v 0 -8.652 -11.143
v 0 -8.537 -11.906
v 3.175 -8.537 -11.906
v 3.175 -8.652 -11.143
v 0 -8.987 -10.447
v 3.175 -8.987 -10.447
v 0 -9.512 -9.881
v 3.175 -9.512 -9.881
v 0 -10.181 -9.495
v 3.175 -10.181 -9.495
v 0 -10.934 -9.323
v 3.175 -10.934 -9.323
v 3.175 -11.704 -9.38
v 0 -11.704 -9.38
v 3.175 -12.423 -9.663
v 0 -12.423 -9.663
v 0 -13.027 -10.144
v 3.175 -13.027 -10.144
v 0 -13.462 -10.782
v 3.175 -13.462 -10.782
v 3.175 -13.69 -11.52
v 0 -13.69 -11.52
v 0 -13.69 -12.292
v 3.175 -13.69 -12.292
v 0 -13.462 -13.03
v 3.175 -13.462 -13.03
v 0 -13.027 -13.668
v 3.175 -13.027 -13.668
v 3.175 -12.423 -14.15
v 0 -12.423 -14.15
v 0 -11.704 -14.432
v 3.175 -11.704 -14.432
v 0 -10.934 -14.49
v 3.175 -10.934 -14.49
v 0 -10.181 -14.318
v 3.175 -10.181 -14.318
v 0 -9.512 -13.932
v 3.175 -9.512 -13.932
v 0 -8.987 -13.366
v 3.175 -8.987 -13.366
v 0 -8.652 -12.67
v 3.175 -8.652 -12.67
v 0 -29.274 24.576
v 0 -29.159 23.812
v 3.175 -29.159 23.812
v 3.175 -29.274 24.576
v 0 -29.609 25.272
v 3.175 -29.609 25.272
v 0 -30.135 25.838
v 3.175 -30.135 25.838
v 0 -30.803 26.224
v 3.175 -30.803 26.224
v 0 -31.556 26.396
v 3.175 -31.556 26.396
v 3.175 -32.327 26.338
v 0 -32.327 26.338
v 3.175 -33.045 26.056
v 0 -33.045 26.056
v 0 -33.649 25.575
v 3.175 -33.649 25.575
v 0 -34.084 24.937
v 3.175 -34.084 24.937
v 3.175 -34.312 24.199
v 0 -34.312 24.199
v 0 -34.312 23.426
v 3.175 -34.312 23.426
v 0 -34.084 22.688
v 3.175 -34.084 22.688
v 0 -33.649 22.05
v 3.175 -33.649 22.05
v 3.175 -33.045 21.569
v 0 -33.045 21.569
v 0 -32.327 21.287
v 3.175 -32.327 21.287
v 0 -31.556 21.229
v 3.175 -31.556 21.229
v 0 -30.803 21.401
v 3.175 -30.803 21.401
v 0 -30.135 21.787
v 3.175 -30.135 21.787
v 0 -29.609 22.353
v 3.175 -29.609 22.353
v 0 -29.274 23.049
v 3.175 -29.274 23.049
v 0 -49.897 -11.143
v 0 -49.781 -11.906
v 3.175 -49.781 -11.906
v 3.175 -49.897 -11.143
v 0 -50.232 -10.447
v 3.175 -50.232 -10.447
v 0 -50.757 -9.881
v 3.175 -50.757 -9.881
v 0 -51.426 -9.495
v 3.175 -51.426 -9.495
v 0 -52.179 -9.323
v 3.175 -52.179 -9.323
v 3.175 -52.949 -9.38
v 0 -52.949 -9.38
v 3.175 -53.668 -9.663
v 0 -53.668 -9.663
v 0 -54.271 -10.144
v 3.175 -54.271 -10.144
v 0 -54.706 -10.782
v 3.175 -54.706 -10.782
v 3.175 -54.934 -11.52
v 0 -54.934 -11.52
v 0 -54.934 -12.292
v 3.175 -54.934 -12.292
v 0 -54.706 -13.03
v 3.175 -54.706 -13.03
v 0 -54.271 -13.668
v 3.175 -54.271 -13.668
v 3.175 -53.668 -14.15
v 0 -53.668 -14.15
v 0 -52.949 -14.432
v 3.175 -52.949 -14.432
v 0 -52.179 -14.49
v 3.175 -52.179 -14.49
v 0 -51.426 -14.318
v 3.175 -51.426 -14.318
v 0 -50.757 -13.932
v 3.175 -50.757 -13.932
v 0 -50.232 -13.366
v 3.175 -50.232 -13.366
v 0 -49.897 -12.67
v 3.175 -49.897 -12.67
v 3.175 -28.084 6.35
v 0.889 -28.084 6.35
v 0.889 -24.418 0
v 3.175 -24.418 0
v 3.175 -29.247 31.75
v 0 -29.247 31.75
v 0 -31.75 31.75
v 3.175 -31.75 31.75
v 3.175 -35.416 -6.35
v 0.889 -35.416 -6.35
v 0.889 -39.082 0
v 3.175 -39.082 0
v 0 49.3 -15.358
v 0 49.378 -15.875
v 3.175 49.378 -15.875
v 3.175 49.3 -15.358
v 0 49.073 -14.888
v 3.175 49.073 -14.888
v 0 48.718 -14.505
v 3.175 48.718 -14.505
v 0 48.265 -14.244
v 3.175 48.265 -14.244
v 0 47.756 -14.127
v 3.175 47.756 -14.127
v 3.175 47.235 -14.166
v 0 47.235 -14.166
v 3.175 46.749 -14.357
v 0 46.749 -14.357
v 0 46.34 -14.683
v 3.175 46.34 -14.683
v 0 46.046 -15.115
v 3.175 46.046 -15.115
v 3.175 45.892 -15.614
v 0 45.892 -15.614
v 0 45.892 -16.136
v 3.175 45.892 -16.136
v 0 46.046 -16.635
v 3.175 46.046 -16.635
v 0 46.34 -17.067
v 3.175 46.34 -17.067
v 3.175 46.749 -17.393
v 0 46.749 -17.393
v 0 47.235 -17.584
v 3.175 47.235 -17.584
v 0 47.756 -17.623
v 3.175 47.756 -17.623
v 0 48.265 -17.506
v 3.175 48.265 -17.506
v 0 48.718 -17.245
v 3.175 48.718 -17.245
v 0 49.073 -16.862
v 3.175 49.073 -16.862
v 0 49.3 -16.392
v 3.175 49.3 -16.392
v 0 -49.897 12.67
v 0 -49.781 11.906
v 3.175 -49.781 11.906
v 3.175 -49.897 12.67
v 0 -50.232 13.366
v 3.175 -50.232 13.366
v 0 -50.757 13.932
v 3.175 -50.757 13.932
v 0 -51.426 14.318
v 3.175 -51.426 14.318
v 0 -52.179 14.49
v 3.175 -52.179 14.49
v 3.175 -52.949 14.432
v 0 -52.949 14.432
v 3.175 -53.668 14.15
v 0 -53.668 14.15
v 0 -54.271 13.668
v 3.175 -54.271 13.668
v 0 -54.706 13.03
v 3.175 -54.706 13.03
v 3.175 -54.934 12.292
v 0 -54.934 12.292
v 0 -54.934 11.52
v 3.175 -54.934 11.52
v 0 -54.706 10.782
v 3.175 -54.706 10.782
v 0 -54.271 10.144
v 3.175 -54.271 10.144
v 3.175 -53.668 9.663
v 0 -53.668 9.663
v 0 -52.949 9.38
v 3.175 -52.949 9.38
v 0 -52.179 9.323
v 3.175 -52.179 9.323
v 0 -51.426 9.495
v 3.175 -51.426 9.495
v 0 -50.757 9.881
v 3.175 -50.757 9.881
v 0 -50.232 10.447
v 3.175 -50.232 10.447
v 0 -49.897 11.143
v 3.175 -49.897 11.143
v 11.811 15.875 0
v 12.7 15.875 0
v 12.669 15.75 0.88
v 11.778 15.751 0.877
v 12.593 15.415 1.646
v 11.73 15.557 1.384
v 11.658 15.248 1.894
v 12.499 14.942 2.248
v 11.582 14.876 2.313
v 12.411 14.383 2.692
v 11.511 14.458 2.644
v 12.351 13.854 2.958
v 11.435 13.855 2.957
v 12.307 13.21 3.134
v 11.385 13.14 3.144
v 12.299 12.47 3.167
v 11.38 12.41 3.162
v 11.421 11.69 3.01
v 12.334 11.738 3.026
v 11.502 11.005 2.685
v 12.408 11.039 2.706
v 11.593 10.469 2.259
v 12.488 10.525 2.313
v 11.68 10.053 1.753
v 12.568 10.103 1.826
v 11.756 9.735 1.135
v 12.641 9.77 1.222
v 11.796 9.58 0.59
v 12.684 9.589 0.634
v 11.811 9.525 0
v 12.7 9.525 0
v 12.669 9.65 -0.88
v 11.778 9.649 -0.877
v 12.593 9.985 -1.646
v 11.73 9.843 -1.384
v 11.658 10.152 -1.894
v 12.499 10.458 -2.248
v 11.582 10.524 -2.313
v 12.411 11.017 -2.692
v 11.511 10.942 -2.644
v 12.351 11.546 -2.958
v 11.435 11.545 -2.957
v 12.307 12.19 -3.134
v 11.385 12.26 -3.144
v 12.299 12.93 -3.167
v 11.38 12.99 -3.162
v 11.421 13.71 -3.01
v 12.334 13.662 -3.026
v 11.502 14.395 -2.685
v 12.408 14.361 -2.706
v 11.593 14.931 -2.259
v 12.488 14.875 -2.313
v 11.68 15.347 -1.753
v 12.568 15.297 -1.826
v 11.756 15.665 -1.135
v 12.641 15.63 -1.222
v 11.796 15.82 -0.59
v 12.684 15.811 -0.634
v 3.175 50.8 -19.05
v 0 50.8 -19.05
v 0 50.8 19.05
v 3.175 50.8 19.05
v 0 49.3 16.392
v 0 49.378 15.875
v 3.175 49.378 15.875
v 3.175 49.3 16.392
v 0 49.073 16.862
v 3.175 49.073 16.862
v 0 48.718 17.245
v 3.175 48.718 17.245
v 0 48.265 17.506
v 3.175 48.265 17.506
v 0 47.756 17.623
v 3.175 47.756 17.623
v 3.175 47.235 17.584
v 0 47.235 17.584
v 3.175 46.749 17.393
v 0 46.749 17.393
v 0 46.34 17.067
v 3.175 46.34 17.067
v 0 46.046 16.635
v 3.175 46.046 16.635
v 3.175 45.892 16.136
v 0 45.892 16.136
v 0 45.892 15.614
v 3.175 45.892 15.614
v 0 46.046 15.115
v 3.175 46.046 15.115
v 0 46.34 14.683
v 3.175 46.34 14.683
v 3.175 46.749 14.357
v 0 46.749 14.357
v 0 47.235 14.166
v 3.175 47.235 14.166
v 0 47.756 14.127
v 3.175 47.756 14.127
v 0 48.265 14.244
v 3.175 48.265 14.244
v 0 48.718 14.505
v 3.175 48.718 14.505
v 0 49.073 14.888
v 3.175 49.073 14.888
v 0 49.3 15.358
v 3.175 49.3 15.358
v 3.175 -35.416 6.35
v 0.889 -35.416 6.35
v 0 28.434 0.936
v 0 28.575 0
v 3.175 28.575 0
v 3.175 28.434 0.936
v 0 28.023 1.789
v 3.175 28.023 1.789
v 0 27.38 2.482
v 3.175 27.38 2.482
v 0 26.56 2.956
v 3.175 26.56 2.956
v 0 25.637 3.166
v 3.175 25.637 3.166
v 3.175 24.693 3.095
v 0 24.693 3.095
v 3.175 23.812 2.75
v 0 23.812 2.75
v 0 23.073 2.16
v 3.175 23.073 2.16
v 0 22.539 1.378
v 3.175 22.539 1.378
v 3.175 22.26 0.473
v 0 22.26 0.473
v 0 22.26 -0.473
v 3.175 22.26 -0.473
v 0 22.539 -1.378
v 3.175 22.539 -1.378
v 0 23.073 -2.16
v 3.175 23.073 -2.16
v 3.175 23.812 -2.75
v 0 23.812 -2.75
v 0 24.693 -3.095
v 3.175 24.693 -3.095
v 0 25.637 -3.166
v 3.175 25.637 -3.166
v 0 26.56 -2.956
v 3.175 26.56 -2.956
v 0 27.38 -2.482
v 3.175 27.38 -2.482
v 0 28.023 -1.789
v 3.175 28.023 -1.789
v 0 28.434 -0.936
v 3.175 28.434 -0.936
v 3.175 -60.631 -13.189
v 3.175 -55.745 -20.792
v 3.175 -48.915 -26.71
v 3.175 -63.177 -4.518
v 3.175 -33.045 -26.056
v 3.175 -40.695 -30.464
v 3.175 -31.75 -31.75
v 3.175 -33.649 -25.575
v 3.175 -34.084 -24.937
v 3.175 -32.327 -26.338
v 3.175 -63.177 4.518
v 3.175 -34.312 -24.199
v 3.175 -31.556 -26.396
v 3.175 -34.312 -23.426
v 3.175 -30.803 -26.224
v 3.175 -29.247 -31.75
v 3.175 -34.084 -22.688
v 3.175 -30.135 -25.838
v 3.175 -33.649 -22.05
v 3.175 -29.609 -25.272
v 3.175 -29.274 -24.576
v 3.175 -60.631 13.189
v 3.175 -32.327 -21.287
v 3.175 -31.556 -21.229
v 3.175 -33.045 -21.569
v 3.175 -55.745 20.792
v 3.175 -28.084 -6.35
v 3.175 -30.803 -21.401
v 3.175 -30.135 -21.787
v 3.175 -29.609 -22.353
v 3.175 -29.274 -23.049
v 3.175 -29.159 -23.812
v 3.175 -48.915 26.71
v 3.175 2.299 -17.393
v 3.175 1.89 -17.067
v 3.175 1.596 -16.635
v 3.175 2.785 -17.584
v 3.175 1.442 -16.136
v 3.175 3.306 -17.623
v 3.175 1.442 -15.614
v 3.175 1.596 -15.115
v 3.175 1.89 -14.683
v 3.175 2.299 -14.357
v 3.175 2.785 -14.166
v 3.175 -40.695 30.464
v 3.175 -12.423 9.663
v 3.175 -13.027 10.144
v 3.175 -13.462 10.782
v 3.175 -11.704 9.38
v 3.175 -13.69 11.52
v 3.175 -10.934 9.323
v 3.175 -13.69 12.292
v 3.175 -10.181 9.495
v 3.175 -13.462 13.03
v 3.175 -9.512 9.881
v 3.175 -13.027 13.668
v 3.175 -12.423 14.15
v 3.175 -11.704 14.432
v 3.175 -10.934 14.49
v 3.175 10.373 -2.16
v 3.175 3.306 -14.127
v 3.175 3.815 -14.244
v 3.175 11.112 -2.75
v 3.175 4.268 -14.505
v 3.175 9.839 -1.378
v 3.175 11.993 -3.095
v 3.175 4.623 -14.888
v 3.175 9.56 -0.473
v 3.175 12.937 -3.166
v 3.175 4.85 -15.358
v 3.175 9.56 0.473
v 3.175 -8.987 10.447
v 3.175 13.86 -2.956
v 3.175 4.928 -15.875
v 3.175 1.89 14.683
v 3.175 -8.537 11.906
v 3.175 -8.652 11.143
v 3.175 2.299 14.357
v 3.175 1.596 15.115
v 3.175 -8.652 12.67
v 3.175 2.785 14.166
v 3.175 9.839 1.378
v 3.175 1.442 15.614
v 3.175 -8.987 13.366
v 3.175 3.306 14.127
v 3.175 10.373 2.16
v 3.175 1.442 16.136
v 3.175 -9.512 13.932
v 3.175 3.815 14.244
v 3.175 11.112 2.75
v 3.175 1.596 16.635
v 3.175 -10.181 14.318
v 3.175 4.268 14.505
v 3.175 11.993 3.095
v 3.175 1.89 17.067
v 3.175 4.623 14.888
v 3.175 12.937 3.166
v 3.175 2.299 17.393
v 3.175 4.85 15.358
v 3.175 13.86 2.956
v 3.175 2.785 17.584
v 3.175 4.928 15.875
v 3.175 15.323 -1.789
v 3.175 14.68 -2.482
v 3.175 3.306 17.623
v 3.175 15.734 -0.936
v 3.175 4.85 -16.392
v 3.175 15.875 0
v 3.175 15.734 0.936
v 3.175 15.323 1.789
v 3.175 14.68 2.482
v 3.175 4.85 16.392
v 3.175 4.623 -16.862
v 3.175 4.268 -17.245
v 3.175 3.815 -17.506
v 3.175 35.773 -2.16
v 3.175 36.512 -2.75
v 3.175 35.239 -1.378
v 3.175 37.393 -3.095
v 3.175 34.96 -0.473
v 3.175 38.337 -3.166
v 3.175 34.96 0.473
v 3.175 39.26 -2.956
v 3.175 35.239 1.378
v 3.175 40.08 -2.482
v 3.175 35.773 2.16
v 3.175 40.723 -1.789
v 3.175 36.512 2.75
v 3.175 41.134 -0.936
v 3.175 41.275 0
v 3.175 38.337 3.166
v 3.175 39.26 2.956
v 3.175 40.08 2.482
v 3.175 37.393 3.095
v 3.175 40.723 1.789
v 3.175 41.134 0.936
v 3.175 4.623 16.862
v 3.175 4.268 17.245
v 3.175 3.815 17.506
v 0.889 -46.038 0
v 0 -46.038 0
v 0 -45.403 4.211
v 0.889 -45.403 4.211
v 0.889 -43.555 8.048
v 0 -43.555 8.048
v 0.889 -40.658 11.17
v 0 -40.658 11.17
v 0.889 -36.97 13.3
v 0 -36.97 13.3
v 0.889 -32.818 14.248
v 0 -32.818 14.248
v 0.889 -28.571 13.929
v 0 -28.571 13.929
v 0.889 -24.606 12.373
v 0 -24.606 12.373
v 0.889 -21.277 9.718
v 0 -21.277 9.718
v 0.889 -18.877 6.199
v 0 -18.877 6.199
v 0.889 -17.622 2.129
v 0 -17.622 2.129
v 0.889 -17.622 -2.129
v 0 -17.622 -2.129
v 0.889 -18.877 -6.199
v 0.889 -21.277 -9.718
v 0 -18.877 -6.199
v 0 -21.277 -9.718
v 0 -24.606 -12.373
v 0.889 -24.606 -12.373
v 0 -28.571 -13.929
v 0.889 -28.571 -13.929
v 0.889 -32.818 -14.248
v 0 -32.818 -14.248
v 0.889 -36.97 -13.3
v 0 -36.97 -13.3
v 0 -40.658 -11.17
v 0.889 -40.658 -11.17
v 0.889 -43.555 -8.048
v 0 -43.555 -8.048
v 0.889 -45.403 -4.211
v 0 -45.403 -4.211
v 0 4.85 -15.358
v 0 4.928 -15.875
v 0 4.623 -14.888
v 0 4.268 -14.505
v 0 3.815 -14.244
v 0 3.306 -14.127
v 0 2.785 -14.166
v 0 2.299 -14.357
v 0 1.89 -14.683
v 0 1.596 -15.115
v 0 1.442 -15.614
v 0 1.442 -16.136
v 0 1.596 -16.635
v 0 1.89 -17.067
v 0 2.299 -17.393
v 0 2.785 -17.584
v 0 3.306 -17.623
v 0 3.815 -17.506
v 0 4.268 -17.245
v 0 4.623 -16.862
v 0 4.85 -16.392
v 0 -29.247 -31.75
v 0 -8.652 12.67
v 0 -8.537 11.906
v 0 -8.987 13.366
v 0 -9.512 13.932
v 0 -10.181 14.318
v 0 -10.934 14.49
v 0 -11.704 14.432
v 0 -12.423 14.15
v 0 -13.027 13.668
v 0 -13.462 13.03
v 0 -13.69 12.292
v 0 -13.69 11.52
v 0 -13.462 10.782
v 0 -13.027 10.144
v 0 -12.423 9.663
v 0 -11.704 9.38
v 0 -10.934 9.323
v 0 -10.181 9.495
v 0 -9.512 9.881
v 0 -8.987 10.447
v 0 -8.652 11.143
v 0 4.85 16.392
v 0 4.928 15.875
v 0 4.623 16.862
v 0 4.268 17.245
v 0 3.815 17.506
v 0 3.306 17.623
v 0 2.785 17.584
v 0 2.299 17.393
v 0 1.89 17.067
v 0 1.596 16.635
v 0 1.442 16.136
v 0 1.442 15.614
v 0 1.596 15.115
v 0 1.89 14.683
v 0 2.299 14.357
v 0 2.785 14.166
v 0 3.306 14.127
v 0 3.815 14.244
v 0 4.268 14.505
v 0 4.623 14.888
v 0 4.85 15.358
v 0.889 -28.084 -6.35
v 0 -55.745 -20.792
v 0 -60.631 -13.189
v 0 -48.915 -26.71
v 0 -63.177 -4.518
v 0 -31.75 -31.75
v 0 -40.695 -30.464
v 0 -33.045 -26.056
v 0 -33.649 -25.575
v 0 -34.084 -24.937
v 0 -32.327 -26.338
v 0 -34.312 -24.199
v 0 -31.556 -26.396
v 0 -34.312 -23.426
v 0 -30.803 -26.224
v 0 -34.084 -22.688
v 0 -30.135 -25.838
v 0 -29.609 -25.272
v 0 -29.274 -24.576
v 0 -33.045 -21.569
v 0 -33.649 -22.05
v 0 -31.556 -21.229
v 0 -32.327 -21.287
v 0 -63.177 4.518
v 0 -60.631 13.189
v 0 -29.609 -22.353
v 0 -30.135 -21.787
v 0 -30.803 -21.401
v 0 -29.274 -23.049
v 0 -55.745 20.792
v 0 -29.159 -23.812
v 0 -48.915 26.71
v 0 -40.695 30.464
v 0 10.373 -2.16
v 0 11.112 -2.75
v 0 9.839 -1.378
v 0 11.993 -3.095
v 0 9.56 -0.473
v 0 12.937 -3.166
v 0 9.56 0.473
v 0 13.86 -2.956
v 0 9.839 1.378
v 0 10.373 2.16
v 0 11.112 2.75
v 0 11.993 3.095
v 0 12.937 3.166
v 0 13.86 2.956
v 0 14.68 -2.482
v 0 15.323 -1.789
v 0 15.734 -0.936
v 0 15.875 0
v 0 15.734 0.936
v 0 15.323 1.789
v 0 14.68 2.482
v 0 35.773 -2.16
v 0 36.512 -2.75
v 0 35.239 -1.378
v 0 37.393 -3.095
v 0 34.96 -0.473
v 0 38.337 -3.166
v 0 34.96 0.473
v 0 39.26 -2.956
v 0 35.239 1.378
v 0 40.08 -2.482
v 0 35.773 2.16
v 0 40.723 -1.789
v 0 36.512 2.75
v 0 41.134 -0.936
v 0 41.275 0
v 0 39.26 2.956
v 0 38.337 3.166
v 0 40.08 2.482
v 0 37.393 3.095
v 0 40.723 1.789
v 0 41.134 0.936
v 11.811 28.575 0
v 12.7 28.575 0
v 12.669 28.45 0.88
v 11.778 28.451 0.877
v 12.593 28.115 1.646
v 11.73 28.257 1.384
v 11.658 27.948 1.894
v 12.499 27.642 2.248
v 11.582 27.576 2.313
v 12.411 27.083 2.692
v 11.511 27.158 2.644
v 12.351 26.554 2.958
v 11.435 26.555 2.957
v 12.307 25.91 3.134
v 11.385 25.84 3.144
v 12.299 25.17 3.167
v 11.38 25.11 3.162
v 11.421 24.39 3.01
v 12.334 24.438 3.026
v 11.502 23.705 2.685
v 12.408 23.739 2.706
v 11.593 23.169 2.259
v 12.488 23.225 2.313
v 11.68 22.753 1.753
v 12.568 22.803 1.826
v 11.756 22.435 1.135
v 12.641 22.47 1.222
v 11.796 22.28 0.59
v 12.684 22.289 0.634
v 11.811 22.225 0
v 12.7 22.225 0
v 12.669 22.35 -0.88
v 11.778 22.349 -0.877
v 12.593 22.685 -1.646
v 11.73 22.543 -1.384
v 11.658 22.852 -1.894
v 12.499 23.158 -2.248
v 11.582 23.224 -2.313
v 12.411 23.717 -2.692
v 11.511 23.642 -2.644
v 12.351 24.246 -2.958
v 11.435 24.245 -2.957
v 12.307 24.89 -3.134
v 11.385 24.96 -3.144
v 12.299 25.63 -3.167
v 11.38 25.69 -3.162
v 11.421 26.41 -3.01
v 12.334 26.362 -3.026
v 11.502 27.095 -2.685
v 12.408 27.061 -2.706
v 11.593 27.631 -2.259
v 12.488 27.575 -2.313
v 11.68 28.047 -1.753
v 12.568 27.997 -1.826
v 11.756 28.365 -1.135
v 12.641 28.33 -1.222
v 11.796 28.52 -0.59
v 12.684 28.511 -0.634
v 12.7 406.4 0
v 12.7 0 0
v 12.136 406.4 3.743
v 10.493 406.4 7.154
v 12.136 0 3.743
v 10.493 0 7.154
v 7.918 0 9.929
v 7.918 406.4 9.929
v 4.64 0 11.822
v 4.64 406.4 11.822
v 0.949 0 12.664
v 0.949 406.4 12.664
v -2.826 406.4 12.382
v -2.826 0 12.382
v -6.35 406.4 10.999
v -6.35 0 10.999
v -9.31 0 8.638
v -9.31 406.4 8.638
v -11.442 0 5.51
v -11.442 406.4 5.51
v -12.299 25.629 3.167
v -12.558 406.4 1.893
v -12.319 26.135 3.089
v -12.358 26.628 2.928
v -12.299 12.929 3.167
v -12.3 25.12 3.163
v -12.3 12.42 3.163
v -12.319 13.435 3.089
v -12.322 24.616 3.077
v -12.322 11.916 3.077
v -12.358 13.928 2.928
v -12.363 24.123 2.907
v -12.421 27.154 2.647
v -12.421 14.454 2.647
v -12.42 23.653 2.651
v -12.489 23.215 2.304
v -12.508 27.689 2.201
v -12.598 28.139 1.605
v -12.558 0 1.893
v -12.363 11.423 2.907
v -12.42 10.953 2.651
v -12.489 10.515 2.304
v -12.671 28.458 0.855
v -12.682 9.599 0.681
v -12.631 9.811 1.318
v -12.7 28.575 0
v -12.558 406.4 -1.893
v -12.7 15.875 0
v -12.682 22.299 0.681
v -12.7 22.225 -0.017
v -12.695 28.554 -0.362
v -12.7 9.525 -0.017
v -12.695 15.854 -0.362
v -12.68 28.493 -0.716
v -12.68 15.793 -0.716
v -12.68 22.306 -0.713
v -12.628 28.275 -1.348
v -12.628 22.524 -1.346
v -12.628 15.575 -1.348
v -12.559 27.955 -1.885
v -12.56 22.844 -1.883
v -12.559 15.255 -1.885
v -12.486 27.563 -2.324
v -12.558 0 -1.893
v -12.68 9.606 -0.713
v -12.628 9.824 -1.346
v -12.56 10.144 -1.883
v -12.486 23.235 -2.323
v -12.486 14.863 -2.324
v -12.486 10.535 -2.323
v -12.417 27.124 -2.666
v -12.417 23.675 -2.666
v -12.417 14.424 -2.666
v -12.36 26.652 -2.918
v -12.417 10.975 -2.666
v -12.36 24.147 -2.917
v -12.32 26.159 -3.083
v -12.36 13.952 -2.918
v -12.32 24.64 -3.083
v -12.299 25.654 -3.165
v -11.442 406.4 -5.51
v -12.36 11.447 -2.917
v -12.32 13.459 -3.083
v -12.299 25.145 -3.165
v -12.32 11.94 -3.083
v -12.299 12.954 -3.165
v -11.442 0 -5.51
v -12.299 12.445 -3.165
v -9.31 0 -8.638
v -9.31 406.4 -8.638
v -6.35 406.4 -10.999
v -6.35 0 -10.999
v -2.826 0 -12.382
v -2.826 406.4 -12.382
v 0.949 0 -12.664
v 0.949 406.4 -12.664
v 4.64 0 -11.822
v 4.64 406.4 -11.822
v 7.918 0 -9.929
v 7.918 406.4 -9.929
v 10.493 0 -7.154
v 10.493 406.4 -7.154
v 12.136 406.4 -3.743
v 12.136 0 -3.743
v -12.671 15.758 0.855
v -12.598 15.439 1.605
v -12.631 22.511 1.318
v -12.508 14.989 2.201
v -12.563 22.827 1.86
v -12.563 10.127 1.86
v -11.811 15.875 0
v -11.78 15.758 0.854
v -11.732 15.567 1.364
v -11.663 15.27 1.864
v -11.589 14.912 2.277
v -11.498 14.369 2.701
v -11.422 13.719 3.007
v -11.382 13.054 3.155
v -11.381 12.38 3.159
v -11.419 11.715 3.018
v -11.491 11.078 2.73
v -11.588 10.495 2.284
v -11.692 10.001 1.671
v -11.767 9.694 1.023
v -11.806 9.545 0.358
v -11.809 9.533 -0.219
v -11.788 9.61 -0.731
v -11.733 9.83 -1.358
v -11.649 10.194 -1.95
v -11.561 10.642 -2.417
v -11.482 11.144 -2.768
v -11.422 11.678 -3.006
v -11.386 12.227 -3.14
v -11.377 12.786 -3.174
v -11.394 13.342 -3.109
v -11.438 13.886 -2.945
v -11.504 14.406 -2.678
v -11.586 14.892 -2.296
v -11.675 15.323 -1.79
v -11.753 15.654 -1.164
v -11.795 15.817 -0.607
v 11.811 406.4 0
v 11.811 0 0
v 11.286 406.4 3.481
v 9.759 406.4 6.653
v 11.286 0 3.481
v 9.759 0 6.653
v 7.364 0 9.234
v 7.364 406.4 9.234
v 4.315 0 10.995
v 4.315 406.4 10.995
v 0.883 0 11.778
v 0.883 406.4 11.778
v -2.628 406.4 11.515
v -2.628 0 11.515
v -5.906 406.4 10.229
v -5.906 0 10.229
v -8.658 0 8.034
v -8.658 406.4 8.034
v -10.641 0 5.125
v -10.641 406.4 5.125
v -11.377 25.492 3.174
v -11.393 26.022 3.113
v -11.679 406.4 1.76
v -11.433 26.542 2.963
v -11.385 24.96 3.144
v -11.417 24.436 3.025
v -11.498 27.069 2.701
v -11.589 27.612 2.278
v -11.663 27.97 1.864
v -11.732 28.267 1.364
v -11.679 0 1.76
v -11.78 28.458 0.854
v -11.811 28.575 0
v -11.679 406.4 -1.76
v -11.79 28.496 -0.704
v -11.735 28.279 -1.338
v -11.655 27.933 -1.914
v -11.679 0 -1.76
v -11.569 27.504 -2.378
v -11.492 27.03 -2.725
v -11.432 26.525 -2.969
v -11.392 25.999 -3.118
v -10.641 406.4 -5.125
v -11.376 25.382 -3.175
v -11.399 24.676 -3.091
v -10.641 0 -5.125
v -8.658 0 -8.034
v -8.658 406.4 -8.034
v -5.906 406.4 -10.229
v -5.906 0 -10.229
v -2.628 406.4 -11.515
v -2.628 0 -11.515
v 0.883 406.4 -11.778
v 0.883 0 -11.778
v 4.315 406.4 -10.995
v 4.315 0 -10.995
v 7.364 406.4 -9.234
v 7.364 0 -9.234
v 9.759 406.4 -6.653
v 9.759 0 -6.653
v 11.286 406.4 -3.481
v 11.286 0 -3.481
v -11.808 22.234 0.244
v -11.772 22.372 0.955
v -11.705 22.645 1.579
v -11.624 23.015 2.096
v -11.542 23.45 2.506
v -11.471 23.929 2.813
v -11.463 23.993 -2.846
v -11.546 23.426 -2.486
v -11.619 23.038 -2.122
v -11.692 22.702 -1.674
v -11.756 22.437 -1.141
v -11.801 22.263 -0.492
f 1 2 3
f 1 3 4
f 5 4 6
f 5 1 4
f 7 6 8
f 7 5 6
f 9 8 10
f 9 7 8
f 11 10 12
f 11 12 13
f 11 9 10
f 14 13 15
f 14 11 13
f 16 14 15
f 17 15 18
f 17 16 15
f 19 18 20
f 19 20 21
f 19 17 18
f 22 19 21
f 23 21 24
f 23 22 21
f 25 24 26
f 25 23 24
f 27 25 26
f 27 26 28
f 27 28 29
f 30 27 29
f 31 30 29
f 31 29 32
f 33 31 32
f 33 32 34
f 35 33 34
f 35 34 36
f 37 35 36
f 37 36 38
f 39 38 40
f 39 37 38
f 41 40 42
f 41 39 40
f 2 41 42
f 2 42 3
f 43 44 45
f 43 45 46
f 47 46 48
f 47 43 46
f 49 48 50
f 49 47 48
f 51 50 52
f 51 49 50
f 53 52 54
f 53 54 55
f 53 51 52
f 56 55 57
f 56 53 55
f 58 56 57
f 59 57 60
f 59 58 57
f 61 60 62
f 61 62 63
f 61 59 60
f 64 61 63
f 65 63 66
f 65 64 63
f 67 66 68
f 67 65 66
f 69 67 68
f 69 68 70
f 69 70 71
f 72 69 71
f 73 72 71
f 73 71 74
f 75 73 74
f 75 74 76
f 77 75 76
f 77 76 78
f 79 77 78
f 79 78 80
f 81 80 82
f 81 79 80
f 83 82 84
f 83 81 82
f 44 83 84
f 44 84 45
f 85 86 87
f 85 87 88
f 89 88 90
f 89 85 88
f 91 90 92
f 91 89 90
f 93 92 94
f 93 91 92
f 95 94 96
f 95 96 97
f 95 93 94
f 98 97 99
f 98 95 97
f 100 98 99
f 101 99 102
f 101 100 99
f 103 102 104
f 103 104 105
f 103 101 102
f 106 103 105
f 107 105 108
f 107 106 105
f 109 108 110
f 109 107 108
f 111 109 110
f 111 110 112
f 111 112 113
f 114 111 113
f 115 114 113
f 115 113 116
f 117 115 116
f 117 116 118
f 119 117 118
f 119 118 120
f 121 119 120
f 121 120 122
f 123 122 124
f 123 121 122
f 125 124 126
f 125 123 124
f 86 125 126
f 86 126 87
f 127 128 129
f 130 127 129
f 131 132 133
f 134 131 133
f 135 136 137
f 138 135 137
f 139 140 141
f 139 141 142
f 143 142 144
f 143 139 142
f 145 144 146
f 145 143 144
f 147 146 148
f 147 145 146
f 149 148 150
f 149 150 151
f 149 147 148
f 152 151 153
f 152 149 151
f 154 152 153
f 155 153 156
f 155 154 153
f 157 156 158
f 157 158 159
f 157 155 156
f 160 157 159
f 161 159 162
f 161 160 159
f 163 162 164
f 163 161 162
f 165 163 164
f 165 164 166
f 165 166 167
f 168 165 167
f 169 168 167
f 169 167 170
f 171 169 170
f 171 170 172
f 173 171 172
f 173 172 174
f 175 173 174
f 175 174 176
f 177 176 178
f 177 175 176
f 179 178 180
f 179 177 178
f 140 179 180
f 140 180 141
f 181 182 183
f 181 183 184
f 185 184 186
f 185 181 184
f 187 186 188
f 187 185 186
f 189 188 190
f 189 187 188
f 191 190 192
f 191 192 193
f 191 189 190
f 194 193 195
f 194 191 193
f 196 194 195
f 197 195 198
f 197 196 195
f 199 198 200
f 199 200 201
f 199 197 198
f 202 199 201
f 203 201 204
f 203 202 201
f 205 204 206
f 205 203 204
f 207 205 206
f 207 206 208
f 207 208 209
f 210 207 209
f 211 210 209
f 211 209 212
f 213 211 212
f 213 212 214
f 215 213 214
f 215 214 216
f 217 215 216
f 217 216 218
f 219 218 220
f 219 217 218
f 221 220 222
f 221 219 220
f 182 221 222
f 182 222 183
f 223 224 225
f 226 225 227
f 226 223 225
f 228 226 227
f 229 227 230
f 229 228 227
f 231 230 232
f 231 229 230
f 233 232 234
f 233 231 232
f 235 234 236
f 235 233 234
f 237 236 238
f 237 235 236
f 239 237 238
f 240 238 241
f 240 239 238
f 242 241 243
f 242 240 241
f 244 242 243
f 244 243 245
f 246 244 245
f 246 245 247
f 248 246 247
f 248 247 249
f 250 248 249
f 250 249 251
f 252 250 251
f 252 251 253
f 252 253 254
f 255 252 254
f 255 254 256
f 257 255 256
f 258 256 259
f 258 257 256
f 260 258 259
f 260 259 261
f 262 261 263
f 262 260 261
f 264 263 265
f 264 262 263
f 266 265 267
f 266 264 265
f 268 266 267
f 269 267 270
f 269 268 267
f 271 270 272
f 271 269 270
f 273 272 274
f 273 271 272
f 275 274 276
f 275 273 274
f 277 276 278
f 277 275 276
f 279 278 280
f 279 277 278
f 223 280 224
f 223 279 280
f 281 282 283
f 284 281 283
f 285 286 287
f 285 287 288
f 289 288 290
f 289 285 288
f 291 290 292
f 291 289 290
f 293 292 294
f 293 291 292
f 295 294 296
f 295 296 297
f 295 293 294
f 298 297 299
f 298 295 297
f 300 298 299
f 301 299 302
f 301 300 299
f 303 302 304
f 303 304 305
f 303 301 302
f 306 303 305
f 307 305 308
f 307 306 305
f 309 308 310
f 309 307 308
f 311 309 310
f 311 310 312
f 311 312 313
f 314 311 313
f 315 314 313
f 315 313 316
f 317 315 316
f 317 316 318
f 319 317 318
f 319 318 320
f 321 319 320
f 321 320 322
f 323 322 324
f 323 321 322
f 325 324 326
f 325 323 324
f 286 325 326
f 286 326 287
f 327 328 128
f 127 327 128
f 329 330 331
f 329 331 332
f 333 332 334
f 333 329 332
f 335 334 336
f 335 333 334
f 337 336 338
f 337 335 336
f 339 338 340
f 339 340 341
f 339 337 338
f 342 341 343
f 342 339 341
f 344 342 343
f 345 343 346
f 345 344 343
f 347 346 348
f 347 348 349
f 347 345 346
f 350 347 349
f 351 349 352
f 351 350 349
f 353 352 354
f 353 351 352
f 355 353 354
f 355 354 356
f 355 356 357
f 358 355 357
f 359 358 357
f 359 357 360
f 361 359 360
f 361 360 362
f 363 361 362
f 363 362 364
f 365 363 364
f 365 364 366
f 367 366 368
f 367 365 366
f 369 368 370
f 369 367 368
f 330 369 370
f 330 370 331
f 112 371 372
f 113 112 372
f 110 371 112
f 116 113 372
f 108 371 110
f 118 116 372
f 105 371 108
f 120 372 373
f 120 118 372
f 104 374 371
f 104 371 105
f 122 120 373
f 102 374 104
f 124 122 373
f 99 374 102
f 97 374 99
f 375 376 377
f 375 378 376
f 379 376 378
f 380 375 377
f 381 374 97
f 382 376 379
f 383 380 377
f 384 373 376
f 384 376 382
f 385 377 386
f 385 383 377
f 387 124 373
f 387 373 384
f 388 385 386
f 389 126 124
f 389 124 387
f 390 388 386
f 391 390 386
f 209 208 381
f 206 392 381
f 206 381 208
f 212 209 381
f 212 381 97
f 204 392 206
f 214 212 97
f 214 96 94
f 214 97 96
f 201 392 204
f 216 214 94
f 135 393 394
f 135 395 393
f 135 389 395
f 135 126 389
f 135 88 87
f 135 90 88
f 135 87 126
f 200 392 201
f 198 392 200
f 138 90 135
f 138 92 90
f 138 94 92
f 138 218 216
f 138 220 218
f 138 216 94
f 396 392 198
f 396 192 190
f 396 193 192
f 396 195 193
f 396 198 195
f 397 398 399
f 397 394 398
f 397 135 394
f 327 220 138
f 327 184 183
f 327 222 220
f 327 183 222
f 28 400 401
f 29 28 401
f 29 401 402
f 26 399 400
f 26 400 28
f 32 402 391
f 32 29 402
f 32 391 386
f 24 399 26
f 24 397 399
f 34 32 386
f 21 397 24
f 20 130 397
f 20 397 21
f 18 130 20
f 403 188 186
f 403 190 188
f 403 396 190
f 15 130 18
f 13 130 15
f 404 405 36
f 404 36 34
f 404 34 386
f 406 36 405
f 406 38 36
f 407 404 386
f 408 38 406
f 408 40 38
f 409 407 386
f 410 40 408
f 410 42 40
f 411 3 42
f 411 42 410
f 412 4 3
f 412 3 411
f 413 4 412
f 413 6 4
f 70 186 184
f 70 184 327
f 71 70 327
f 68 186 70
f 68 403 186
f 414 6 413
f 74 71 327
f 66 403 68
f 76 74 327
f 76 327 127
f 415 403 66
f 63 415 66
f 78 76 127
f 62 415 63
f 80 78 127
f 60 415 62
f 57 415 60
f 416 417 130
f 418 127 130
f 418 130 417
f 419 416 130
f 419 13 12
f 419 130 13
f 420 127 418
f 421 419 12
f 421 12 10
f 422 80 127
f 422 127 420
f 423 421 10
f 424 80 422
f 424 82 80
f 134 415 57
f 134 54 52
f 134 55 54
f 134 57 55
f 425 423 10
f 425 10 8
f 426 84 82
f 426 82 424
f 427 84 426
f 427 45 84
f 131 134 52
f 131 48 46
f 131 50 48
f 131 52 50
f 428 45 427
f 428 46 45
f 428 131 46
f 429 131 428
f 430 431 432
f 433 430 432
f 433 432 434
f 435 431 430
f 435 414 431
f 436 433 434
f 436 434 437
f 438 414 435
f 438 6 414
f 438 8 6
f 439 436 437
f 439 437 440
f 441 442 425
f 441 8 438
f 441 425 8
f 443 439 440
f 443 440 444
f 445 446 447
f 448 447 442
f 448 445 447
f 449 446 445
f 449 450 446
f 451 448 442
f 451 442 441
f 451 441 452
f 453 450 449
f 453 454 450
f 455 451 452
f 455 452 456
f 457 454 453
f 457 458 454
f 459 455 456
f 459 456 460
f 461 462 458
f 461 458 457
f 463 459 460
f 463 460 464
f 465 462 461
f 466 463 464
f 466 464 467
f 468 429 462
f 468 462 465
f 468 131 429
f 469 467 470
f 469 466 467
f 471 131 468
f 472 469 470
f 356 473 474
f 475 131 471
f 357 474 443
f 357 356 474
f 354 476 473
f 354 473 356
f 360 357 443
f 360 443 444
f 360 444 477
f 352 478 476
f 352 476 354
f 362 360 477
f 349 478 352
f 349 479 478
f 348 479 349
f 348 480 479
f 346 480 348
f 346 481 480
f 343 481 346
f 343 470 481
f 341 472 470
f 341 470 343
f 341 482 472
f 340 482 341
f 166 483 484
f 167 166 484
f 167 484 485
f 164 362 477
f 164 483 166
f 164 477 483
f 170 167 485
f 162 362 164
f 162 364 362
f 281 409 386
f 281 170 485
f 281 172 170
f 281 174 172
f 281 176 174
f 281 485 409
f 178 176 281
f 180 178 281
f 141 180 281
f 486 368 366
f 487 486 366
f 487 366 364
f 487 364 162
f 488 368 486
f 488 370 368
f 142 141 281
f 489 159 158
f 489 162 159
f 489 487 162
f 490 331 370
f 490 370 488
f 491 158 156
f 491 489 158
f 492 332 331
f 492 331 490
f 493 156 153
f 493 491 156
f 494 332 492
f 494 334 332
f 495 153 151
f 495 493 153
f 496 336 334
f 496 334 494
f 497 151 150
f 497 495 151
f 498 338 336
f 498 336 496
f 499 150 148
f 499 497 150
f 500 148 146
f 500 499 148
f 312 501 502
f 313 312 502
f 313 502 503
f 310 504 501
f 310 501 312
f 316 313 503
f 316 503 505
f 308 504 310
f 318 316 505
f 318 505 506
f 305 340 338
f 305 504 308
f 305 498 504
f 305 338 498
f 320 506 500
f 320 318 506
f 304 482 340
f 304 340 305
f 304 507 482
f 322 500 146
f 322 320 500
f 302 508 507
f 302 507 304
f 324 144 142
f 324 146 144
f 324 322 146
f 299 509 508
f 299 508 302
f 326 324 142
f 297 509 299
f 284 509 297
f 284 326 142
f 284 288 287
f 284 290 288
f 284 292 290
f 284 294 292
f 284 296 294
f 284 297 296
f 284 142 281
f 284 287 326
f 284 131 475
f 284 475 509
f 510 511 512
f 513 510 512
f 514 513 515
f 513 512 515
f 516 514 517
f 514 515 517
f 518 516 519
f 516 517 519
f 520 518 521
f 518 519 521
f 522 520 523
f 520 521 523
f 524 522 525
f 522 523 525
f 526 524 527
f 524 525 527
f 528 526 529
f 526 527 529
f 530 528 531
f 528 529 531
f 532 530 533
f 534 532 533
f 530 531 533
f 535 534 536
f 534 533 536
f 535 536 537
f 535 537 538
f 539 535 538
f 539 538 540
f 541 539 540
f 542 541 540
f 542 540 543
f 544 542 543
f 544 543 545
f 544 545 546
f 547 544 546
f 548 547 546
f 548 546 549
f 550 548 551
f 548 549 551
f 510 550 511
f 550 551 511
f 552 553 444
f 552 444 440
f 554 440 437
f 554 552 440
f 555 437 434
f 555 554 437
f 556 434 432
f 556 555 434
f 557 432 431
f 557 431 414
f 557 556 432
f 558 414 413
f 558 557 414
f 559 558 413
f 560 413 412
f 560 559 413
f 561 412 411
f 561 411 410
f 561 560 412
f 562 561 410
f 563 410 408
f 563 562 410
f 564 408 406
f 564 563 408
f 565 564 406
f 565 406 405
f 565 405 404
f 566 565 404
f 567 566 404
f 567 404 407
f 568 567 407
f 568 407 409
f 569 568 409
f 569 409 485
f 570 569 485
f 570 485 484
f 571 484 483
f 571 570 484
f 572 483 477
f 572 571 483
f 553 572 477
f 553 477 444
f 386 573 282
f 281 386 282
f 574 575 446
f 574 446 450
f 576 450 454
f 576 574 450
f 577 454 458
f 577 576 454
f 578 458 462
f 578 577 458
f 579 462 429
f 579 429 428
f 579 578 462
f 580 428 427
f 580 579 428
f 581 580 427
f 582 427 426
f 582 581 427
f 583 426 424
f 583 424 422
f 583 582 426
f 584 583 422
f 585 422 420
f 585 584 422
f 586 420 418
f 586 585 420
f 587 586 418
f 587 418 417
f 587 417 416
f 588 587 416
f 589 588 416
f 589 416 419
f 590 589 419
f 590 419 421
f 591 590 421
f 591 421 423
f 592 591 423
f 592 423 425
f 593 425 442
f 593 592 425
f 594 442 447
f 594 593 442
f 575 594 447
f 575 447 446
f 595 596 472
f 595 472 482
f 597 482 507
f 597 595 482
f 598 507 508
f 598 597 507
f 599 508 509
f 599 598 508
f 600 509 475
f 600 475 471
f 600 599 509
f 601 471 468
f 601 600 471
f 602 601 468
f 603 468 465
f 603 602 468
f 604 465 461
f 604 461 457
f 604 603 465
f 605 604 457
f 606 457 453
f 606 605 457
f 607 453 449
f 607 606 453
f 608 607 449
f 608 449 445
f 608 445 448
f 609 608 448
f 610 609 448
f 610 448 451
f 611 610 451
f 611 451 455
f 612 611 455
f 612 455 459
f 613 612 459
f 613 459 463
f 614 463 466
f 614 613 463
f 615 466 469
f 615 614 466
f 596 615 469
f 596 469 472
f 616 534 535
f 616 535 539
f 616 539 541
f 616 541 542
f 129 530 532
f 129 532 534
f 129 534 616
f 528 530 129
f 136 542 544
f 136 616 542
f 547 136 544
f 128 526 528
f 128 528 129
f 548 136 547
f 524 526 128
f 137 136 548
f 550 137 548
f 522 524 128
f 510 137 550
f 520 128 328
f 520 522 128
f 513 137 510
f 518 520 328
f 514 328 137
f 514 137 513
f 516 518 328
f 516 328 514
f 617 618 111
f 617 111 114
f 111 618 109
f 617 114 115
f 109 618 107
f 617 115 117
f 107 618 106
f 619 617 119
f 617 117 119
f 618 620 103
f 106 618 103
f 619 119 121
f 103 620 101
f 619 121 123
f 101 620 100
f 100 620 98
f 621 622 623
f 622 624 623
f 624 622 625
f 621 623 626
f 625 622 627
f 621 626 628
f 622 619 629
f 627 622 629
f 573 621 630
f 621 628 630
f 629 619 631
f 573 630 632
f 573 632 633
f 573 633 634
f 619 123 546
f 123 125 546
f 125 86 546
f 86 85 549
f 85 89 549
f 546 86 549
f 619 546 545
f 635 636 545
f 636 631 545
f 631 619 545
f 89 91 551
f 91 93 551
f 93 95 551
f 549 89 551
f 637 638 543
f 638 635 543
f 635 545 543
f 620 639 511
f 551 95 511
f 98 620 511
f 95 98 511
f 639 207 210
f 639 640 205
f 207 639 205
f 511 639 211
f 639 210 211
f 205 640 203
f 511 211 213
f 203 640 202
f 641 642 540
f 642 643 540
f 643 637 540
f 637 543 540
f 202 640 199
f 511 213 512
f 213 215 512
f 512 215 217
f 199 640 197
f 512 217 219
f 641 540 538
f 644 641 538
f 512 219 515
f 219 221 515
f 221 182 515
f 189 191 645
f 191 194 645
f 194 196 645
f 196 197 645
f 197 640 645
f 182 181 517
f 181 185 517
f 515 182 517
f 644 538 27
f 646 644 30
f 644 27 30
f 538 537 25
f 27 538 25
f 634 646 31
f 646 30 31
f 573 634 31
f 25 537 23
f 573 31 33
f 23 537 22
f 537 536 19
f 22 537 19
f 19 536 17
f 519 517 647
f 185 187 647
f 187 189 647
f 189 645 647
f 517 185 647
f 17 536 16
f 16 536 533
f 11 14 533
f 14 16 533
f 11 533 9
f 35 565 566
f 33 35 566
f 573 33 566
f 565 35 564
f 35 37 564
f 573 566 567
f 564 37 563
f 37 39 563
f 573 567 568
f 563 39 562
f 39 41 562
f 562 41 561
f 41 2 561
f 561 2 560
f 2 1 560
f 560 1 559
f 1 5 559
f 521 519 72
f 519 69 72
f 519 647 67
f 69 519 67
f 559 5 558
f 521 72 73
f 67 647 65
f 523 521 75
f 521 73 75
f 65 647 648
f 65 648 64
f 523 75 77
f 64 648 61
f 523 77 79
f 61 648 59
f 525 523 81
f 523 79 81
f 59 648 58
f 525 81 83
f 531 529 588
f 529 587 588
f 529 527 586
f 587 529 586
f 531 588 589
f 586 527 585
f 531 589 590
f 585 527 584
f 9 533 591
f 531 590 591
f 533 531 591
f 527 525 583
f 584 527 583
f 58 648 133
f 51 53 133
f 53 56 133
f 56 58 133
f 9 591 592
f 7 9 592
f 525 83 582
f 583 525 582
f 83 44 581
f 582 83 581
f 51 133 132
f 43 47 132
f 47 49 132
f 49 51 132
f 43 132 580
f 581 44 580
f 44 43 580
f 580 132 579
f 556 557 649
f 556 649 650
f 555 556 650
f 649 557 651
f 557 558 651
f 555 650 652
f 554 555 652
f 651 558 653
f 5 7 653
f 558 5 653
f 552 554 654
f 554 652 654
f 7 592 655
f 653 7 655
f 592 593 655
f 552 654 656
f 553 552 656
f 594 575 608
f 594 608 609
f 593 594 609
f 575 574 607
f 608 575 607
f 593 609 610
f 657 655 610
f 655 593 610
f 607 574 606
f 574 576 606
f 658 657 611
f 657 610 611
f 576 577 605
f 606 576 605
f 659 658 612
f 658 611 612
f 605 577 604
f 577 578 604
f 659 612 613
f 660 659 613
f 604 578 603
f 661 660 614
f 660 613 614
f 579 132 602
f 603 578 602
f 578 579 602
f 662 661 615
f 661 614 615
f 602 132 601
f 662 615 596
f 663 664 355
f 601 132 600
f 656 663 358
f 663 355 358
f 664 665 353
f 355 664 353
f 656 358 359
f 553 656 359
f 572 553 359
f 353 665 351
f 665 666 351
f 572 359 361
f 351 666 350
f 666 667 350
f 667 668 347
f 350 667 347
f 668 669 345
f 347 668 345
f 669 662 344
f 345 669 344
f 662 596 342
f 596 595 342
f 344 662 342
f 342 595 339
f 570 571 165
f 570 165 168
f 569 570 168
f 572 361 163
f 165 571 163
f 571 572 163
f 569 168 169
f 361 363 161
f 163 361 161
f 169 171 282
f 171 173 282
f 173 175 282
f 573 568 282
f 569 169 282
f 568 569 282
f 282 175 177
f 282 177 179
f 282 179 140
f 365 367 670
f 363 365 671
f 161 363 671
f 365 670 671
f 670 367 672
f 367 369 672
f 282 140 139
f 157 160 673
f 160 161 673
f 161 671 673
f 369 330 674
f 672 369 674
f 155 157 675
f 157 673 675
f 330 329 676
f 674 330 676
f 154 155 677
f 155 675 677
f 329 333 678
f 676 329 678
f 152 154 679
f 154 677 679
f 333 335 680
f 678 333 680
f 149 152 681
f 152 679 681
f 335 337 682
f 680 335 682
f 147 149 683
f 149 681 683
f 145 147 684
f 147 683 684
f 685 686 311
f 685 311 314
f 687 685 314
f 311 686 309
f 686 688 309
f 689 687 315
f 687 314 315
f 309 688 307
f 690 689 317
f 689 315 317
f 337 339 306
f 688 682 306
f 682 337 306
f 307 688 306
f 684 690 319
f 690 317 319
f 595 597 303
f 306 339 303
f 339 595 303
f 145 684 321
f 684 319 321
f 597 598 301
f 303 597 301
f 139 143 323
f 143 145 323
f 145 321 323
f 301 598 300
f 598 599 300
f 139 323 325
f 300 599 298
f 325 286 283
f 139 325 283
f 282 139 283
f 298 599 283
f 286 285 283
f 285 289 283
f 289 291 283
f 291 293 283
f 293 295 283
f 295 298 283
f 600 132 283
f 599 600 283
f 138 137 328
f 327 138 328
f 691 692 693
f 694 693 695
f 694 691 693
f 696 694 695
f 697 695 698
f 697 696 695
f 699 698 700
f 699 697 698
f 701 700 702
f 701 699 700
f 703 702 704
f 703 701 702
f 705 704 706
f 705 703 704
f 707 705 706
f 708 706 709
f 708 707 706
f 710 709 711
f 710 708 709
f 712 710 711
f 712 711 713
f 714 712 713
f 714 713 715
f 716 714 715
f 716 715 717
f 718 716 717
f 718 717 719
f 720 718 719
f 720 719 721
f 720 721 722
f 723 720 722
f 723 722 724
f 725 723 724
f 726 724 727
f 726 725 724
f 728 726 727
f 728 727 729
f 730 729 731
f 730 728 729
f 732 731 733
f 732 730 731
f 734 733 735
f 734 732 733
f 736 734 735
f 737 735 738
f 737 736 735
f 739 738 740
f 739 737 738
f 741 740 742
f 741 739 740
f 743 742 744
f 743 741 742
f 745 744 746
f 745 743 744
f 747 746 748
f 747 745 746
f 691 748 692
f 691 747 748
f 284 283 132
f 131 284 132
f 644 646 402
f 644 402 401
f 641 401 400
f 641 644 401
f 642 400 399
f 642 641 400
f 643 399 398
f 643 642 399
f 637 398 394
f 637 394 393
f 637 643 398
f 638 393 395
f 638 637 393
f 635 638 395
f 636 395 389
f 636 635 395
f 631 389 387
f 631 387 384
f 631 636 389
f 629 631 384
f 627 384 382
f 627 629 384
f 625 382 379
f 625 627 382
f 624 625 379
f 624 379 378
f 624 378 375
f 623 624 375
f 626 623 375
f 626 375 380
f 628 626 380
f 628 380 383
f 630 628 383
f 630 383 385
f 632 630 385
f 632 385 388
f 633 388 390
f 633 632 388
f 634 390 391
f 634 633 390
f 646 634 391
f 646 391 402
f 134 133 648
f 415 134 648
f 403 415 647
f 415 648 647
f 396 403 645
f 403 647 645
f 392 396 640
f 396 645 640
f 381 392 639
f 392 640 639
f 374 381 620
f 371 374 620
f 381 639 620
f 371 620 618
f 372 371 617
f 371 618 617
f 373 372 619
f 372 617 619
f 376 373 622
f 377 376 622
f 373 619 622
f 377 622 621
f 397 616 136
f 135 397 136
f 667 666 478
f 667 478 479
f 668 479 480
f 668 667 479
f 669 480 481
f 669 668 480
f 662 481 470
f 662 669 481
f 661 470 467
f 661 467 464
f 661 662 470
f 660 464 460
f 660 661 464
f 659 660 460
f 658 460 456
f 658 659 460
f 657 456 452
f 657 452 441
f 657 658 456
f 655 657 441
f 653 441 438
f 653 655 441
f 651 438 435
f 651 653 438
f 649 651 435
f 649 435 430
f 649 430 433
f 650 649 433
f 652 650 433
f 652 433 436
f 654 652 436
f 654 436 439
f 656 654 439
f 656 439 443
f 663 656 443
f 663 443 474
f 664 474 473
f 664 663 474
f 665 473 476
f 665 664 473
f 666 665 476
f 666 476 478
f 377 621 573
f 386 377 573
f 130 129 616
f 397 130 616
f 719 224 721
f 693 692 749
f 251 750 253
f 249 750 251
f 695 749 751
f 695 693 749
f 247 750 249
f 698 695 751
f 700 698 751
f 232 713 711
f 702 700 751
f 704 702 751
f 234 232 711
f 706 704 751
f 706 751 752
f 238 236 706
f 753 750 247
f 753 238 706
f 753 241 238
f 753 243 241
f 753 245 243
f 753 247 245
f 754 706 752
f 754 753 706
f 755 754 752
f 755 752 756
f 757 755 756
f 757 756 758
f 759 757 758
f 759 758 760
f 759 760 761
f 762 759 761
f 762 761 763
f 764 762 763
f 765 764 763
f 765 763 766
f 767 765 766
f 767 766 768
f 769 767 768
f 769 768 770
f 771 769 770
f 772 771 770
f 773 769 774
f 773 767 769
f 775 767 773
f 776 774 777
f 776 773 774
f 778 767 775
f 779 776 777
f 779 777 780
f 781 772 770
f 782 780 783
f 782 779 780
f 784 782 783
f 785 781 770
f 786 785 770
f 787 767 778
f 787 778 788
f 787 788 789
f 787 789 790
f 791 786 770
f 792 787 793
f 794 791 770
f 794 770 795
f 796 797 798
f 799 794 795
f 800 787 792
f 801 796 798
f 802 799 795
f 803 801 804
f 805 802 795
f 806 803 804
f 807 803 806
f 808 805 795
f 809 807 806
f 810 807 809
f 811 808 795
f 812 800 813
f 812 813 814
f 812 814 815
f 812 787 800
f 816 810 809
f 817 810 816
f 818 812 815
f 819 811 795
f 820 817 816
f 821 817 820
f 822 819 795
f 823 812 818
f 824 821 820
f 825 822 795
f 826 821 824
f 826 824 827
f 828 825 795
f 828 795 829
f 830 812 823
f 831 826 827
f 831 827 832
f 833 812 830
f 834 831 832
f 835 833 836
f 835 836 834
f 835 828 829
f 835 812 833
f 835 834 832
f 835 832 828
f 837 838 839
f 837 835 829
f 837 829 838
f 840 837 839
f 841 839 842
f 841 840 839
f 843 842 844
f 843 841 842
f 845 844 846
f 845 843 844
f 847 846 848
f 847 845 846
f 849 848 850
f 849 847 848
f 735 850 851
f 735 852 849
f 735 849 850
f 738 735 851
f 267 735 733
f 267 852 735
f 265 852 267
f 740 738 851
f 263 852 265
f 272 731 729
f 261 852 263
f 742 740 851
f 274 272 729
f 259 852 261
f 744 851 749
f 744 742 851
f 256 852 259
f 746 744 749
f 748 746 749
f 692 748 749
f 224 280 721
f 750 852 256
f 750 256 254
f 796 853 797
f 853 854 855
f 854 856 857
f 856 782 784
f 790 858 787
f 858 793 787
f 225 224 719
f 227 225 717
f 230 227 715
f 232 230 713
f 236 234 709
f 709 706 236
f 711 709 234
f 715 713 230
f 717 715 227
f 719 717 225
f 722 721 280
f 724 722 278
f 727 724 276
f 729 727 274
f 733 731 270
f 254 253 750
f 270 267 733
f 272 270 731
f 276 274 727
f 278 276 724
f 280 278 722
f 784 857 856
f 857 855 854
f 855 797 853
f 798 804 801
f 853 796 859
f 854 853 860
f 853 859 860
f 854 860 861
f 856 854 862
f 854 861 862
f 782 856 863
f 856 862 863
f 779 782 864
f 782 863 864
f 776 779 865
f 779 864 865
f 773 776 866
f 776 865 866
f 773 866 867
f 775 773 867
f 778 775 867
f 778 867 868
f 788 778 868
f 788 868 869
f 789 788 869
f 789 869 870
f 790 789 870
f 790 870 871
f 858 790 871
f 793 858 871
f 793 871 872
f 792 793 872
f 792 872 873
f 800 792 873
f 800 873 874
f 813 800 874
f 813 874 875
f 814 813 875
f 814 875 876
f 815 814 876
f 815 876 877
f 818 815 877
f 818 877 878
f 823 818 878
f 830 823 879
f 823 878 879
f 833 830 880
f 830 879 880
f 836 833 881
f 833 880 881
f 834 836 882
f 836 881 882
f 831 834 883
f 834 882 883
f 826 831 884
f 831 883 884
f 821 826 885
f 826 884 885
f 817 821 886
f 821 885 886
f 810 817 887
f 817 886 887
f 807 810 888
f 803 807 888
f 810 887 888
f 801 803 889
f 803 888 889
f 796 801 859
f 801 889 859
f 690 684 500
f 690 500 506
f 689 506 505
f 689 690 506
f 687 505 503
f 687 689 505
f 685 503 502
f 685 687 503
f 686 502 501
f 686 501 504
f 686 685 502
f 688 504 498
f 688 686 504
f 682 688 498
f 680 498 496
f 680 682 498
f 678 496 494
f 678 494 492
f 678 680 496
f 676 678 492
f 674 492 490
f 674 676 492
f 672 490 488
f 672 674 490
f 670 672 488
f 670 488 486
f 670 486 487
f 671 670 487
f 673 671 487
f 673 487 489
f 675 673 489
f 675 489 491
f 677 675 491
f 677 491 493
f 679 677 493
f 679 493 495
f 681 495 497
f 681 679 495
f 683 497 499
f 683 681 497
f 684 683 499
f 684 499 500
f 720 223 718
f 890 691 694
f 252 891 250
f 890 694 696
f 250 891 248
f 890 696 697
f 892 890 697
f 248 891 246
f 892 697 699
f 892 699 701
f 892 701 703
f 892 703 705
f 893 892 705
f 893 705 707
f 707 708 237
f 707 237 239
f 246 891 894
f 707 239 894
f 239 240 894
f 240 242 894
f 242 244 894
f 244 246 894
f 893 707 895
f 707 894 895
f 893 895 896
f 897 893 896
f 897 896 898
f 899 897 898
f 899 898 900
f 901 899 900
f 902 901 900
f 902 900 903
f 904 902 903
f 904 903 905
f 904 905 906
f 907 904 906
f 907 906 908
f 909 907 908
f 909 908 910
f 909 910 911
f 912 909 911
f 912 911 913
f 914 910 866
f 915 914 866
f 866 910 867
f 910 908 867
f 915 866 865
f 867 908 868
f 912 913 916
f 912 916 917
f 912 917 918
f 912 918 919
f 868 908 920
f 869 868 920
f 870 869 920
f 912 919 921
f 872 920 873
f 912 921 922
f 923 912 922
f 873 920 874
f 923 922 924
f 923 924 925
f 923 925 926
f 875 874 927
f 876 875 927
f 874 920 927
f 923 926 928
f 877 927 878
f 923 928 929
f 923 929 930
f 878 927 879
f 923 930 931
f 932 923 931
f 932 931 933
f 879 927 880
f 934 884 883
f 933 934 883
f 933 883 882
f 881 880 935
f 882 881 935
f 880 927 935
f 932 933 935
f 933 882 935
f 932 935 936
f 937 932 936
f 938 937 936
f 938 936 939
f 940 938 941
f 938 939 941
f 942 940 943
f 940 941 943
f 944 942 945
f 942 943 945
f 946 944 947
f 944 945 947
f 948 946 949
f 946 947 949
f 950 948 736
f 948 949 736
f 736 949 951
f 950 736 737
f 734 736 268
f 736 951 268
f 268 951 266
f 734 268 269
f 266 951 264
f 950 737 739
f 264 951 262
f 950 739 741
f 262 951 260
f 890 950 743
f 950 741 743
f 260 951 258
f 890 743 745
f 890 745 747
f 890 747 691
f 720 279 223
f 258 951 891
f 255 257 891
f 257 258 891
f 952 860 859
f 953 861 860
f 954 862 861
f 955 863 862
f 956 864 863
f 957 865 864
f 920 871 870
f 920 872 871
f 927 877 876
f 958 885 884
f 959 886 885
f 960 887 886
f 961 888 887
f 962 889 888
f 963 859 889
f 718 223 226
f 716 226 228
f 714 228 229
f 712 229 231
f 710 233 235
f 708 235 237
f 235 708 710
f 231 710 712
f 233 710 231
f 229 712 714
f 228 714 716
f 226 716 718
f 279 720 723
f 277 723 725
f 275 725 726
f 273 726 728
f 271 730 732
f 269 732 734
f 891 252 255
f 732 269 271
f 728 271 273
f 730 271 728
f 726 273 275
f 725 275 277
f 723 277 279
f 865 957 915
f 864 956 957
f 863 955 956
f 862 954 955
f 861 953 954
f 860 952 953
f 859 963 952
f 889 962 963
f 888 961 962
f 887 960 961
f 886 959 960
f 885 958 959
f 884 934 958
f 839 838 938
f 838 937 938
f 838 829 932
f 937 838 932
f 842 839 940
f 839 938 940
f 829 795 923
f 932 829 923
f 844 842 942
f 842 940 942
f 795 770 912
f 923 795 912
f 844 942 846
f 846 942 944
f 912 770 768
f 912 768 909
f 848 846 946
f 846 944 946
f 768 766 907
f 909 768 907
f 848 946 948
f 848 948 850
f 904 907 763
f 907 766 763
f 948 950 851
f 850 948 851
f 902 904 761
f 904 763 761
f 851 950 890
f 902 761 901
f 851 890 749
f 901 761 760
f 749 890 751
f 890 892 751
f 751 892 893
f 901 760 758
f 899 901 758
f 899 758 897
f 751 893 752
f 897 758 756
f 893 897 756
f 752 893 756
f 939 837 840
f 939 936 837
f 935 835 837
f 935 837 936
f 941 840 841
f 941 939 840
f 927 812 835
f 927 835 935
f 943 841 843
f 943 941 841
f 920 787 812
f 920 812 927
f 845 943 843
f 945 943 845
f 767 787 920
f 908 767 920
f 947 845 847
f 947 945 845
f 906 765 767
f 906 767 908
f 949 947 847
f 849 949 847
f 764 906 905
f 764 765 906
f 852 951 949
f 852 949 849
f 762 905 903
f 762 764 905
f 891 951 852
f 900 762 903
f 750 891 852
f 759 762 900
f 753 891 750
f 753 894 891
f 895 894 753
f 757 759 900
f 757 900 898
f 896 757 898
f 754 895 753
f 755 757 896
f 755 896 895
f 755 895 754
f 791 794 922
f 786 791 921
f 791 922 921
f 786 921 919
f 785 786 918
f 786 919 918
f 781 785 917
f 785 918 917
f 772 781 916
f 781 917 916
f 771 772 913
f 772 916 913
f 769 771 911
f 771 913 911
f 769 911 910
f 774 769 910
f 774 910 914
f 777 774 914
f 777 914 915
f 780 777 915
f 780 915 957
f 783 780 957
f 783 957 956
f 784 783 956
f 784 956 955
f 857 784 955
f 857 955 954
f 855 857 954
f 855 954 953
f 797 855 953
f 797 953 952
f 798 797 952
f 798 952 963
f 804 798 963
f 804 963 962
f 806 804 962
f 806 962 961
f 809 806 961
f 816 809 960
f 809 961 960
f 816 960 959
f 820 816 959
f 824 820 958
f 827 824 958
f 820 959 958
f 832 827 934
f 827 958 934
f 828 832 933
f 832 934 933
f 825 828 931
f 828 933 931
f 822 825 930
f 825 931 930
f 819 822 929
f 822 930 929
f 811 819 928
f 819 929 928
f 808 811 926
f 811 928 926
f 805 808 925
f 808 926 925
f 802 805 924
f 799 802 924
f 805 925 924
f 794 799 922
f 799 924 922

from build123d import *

# Parameters (mm, degrees)
F0_R          = 12.7
F0_R_2        = 11.811
F1_DEPTH      = 406.4
F2_R          = 3.175
F3_DEPTH      = 12.701
F3_DEPTH_BACK = 25.4
F4_R          = 2.5908
F4_R_2        = 1.7526
F4_R_3        = 3.175
F5_DEPTH      = 3.175
F6_R          = 14.2875
F7_DEPTH      = 0.889


with BuildPart() as f1:
    # F0 (on Front) → F1 (new body)
    with BuildSketch(Plane.XZ):
        Circle(F0_R)
        Circle(F0_R_2, mode=Mode.SUBTRACT)
    extrude(amount=-F1_DEPTH)

    # F2 (on Right) → F3 (cut, two sides)
    with BuildSketch(Plane.YZ) as f3_sk:
        with Locations((12.7, 0)):
            Circle(F2_R)
        with Locations((25.4, 0)):
            Circle(F2_R)
    extrude(amount=-F3_DEPTH, mode=Mode.SUBTRACT)
    extrude(f3_sk.sketch, amount=F3_DEPTH_BACK, mode=Mode.SUBTRACT)


with BuildPart() as f5:
    # F4 (on Right) → F5 (new body)
    with BuildSketch(Plane.YZ):
        with BuildLine():
            Line((-29.246976355, 31.75), (-31.75, 31.75))
            ThreePointArc((-31.75, 31.75), (-63.5, 0), (-31.75, -31.75))
            Line((-31.75, -31.75), (-29.246976355, -31.75))
            Line((-29.246976355, -31.75), (50.8, -19.05))
            Line((50.8, -19.05), (50.8, 19.05))
            Line((50.8, 19.05), (-29.246976355, 31.75))
        make_face()
        with Locations((-31.75, -23.8125)):
            Circle(F4_R, mode=Mode.SUBTRACT)
        with Locations((-52.3722299276, -11.90625)):
            Circle(F4_R, mode=Mode.SUBTRACT)
        with Locations((-11.1277700724, -11.90625)):
            Circle(F4_R, mode=Mode.SUBTRACT)
        with Locations((3.175, -15.875)):
            Circle(F4_R_2, mode=Mode.SUBTRACT)
        with Locations((47.625, -15.875)):
            Circle(F4_R_2, mode=Mode.SUBTRACT)
        with Locations((-52.3722299276, 11.90625)):
            Circle(F4_R, mode=Mode.SUBTRACT)
        Polygon((-24.4176515813, 0), (-28.0838257906, -6.35), (-35.4161742094, -6.35), (-39.0823484187, 0), (-35.4161742094, 6.35), (-28.0838257906, 6.35), align=None, mode=Mode.SUBTRACT)
        with Locations((-11.1277700724, 11.90625)):
            Circle(F4_R, mode=Mode.SUBTRACT)
        with Locations((-31.75, 23.8125)):
            Circle(F4_R, mode=Mode.SUBTRACT)
        with Locations((12.7, 0)):
            Circle(F4_R_3, mode=Mode.SUBTRACT)
        with Locations((25.4, 0)):
            Circle(F4_R_3, mode=Mode.SUBTRACT)
        with Locations((38.1, 0)):
            Circle(F4_R_3, mode=Mode.SUBTRACT)
        with Locations((3.175, 15.875)):
            Circle(F4_R_2, mode=Mode.SUBTRACT)
        with Locations((47.625, 15.875)):
            Circle(F4_R_2, mode=Mode.SUBTRACT)
    extrude(amount=F5_DEPTH)

    # F6 (on face) → F7 (cut)
    with BuildSketch(Plane(origin=(0, 0, 0), x_dir=(0, -1, 0), z_dir=(-1, 0, 0))):
        with Locations((31.75, 0)):
            Circle(F6_R)
    extrude(amount=-F7_DEPTH, mode=Mode.SUBTRACT)


solid = Compound([f1.part, f5.part])
